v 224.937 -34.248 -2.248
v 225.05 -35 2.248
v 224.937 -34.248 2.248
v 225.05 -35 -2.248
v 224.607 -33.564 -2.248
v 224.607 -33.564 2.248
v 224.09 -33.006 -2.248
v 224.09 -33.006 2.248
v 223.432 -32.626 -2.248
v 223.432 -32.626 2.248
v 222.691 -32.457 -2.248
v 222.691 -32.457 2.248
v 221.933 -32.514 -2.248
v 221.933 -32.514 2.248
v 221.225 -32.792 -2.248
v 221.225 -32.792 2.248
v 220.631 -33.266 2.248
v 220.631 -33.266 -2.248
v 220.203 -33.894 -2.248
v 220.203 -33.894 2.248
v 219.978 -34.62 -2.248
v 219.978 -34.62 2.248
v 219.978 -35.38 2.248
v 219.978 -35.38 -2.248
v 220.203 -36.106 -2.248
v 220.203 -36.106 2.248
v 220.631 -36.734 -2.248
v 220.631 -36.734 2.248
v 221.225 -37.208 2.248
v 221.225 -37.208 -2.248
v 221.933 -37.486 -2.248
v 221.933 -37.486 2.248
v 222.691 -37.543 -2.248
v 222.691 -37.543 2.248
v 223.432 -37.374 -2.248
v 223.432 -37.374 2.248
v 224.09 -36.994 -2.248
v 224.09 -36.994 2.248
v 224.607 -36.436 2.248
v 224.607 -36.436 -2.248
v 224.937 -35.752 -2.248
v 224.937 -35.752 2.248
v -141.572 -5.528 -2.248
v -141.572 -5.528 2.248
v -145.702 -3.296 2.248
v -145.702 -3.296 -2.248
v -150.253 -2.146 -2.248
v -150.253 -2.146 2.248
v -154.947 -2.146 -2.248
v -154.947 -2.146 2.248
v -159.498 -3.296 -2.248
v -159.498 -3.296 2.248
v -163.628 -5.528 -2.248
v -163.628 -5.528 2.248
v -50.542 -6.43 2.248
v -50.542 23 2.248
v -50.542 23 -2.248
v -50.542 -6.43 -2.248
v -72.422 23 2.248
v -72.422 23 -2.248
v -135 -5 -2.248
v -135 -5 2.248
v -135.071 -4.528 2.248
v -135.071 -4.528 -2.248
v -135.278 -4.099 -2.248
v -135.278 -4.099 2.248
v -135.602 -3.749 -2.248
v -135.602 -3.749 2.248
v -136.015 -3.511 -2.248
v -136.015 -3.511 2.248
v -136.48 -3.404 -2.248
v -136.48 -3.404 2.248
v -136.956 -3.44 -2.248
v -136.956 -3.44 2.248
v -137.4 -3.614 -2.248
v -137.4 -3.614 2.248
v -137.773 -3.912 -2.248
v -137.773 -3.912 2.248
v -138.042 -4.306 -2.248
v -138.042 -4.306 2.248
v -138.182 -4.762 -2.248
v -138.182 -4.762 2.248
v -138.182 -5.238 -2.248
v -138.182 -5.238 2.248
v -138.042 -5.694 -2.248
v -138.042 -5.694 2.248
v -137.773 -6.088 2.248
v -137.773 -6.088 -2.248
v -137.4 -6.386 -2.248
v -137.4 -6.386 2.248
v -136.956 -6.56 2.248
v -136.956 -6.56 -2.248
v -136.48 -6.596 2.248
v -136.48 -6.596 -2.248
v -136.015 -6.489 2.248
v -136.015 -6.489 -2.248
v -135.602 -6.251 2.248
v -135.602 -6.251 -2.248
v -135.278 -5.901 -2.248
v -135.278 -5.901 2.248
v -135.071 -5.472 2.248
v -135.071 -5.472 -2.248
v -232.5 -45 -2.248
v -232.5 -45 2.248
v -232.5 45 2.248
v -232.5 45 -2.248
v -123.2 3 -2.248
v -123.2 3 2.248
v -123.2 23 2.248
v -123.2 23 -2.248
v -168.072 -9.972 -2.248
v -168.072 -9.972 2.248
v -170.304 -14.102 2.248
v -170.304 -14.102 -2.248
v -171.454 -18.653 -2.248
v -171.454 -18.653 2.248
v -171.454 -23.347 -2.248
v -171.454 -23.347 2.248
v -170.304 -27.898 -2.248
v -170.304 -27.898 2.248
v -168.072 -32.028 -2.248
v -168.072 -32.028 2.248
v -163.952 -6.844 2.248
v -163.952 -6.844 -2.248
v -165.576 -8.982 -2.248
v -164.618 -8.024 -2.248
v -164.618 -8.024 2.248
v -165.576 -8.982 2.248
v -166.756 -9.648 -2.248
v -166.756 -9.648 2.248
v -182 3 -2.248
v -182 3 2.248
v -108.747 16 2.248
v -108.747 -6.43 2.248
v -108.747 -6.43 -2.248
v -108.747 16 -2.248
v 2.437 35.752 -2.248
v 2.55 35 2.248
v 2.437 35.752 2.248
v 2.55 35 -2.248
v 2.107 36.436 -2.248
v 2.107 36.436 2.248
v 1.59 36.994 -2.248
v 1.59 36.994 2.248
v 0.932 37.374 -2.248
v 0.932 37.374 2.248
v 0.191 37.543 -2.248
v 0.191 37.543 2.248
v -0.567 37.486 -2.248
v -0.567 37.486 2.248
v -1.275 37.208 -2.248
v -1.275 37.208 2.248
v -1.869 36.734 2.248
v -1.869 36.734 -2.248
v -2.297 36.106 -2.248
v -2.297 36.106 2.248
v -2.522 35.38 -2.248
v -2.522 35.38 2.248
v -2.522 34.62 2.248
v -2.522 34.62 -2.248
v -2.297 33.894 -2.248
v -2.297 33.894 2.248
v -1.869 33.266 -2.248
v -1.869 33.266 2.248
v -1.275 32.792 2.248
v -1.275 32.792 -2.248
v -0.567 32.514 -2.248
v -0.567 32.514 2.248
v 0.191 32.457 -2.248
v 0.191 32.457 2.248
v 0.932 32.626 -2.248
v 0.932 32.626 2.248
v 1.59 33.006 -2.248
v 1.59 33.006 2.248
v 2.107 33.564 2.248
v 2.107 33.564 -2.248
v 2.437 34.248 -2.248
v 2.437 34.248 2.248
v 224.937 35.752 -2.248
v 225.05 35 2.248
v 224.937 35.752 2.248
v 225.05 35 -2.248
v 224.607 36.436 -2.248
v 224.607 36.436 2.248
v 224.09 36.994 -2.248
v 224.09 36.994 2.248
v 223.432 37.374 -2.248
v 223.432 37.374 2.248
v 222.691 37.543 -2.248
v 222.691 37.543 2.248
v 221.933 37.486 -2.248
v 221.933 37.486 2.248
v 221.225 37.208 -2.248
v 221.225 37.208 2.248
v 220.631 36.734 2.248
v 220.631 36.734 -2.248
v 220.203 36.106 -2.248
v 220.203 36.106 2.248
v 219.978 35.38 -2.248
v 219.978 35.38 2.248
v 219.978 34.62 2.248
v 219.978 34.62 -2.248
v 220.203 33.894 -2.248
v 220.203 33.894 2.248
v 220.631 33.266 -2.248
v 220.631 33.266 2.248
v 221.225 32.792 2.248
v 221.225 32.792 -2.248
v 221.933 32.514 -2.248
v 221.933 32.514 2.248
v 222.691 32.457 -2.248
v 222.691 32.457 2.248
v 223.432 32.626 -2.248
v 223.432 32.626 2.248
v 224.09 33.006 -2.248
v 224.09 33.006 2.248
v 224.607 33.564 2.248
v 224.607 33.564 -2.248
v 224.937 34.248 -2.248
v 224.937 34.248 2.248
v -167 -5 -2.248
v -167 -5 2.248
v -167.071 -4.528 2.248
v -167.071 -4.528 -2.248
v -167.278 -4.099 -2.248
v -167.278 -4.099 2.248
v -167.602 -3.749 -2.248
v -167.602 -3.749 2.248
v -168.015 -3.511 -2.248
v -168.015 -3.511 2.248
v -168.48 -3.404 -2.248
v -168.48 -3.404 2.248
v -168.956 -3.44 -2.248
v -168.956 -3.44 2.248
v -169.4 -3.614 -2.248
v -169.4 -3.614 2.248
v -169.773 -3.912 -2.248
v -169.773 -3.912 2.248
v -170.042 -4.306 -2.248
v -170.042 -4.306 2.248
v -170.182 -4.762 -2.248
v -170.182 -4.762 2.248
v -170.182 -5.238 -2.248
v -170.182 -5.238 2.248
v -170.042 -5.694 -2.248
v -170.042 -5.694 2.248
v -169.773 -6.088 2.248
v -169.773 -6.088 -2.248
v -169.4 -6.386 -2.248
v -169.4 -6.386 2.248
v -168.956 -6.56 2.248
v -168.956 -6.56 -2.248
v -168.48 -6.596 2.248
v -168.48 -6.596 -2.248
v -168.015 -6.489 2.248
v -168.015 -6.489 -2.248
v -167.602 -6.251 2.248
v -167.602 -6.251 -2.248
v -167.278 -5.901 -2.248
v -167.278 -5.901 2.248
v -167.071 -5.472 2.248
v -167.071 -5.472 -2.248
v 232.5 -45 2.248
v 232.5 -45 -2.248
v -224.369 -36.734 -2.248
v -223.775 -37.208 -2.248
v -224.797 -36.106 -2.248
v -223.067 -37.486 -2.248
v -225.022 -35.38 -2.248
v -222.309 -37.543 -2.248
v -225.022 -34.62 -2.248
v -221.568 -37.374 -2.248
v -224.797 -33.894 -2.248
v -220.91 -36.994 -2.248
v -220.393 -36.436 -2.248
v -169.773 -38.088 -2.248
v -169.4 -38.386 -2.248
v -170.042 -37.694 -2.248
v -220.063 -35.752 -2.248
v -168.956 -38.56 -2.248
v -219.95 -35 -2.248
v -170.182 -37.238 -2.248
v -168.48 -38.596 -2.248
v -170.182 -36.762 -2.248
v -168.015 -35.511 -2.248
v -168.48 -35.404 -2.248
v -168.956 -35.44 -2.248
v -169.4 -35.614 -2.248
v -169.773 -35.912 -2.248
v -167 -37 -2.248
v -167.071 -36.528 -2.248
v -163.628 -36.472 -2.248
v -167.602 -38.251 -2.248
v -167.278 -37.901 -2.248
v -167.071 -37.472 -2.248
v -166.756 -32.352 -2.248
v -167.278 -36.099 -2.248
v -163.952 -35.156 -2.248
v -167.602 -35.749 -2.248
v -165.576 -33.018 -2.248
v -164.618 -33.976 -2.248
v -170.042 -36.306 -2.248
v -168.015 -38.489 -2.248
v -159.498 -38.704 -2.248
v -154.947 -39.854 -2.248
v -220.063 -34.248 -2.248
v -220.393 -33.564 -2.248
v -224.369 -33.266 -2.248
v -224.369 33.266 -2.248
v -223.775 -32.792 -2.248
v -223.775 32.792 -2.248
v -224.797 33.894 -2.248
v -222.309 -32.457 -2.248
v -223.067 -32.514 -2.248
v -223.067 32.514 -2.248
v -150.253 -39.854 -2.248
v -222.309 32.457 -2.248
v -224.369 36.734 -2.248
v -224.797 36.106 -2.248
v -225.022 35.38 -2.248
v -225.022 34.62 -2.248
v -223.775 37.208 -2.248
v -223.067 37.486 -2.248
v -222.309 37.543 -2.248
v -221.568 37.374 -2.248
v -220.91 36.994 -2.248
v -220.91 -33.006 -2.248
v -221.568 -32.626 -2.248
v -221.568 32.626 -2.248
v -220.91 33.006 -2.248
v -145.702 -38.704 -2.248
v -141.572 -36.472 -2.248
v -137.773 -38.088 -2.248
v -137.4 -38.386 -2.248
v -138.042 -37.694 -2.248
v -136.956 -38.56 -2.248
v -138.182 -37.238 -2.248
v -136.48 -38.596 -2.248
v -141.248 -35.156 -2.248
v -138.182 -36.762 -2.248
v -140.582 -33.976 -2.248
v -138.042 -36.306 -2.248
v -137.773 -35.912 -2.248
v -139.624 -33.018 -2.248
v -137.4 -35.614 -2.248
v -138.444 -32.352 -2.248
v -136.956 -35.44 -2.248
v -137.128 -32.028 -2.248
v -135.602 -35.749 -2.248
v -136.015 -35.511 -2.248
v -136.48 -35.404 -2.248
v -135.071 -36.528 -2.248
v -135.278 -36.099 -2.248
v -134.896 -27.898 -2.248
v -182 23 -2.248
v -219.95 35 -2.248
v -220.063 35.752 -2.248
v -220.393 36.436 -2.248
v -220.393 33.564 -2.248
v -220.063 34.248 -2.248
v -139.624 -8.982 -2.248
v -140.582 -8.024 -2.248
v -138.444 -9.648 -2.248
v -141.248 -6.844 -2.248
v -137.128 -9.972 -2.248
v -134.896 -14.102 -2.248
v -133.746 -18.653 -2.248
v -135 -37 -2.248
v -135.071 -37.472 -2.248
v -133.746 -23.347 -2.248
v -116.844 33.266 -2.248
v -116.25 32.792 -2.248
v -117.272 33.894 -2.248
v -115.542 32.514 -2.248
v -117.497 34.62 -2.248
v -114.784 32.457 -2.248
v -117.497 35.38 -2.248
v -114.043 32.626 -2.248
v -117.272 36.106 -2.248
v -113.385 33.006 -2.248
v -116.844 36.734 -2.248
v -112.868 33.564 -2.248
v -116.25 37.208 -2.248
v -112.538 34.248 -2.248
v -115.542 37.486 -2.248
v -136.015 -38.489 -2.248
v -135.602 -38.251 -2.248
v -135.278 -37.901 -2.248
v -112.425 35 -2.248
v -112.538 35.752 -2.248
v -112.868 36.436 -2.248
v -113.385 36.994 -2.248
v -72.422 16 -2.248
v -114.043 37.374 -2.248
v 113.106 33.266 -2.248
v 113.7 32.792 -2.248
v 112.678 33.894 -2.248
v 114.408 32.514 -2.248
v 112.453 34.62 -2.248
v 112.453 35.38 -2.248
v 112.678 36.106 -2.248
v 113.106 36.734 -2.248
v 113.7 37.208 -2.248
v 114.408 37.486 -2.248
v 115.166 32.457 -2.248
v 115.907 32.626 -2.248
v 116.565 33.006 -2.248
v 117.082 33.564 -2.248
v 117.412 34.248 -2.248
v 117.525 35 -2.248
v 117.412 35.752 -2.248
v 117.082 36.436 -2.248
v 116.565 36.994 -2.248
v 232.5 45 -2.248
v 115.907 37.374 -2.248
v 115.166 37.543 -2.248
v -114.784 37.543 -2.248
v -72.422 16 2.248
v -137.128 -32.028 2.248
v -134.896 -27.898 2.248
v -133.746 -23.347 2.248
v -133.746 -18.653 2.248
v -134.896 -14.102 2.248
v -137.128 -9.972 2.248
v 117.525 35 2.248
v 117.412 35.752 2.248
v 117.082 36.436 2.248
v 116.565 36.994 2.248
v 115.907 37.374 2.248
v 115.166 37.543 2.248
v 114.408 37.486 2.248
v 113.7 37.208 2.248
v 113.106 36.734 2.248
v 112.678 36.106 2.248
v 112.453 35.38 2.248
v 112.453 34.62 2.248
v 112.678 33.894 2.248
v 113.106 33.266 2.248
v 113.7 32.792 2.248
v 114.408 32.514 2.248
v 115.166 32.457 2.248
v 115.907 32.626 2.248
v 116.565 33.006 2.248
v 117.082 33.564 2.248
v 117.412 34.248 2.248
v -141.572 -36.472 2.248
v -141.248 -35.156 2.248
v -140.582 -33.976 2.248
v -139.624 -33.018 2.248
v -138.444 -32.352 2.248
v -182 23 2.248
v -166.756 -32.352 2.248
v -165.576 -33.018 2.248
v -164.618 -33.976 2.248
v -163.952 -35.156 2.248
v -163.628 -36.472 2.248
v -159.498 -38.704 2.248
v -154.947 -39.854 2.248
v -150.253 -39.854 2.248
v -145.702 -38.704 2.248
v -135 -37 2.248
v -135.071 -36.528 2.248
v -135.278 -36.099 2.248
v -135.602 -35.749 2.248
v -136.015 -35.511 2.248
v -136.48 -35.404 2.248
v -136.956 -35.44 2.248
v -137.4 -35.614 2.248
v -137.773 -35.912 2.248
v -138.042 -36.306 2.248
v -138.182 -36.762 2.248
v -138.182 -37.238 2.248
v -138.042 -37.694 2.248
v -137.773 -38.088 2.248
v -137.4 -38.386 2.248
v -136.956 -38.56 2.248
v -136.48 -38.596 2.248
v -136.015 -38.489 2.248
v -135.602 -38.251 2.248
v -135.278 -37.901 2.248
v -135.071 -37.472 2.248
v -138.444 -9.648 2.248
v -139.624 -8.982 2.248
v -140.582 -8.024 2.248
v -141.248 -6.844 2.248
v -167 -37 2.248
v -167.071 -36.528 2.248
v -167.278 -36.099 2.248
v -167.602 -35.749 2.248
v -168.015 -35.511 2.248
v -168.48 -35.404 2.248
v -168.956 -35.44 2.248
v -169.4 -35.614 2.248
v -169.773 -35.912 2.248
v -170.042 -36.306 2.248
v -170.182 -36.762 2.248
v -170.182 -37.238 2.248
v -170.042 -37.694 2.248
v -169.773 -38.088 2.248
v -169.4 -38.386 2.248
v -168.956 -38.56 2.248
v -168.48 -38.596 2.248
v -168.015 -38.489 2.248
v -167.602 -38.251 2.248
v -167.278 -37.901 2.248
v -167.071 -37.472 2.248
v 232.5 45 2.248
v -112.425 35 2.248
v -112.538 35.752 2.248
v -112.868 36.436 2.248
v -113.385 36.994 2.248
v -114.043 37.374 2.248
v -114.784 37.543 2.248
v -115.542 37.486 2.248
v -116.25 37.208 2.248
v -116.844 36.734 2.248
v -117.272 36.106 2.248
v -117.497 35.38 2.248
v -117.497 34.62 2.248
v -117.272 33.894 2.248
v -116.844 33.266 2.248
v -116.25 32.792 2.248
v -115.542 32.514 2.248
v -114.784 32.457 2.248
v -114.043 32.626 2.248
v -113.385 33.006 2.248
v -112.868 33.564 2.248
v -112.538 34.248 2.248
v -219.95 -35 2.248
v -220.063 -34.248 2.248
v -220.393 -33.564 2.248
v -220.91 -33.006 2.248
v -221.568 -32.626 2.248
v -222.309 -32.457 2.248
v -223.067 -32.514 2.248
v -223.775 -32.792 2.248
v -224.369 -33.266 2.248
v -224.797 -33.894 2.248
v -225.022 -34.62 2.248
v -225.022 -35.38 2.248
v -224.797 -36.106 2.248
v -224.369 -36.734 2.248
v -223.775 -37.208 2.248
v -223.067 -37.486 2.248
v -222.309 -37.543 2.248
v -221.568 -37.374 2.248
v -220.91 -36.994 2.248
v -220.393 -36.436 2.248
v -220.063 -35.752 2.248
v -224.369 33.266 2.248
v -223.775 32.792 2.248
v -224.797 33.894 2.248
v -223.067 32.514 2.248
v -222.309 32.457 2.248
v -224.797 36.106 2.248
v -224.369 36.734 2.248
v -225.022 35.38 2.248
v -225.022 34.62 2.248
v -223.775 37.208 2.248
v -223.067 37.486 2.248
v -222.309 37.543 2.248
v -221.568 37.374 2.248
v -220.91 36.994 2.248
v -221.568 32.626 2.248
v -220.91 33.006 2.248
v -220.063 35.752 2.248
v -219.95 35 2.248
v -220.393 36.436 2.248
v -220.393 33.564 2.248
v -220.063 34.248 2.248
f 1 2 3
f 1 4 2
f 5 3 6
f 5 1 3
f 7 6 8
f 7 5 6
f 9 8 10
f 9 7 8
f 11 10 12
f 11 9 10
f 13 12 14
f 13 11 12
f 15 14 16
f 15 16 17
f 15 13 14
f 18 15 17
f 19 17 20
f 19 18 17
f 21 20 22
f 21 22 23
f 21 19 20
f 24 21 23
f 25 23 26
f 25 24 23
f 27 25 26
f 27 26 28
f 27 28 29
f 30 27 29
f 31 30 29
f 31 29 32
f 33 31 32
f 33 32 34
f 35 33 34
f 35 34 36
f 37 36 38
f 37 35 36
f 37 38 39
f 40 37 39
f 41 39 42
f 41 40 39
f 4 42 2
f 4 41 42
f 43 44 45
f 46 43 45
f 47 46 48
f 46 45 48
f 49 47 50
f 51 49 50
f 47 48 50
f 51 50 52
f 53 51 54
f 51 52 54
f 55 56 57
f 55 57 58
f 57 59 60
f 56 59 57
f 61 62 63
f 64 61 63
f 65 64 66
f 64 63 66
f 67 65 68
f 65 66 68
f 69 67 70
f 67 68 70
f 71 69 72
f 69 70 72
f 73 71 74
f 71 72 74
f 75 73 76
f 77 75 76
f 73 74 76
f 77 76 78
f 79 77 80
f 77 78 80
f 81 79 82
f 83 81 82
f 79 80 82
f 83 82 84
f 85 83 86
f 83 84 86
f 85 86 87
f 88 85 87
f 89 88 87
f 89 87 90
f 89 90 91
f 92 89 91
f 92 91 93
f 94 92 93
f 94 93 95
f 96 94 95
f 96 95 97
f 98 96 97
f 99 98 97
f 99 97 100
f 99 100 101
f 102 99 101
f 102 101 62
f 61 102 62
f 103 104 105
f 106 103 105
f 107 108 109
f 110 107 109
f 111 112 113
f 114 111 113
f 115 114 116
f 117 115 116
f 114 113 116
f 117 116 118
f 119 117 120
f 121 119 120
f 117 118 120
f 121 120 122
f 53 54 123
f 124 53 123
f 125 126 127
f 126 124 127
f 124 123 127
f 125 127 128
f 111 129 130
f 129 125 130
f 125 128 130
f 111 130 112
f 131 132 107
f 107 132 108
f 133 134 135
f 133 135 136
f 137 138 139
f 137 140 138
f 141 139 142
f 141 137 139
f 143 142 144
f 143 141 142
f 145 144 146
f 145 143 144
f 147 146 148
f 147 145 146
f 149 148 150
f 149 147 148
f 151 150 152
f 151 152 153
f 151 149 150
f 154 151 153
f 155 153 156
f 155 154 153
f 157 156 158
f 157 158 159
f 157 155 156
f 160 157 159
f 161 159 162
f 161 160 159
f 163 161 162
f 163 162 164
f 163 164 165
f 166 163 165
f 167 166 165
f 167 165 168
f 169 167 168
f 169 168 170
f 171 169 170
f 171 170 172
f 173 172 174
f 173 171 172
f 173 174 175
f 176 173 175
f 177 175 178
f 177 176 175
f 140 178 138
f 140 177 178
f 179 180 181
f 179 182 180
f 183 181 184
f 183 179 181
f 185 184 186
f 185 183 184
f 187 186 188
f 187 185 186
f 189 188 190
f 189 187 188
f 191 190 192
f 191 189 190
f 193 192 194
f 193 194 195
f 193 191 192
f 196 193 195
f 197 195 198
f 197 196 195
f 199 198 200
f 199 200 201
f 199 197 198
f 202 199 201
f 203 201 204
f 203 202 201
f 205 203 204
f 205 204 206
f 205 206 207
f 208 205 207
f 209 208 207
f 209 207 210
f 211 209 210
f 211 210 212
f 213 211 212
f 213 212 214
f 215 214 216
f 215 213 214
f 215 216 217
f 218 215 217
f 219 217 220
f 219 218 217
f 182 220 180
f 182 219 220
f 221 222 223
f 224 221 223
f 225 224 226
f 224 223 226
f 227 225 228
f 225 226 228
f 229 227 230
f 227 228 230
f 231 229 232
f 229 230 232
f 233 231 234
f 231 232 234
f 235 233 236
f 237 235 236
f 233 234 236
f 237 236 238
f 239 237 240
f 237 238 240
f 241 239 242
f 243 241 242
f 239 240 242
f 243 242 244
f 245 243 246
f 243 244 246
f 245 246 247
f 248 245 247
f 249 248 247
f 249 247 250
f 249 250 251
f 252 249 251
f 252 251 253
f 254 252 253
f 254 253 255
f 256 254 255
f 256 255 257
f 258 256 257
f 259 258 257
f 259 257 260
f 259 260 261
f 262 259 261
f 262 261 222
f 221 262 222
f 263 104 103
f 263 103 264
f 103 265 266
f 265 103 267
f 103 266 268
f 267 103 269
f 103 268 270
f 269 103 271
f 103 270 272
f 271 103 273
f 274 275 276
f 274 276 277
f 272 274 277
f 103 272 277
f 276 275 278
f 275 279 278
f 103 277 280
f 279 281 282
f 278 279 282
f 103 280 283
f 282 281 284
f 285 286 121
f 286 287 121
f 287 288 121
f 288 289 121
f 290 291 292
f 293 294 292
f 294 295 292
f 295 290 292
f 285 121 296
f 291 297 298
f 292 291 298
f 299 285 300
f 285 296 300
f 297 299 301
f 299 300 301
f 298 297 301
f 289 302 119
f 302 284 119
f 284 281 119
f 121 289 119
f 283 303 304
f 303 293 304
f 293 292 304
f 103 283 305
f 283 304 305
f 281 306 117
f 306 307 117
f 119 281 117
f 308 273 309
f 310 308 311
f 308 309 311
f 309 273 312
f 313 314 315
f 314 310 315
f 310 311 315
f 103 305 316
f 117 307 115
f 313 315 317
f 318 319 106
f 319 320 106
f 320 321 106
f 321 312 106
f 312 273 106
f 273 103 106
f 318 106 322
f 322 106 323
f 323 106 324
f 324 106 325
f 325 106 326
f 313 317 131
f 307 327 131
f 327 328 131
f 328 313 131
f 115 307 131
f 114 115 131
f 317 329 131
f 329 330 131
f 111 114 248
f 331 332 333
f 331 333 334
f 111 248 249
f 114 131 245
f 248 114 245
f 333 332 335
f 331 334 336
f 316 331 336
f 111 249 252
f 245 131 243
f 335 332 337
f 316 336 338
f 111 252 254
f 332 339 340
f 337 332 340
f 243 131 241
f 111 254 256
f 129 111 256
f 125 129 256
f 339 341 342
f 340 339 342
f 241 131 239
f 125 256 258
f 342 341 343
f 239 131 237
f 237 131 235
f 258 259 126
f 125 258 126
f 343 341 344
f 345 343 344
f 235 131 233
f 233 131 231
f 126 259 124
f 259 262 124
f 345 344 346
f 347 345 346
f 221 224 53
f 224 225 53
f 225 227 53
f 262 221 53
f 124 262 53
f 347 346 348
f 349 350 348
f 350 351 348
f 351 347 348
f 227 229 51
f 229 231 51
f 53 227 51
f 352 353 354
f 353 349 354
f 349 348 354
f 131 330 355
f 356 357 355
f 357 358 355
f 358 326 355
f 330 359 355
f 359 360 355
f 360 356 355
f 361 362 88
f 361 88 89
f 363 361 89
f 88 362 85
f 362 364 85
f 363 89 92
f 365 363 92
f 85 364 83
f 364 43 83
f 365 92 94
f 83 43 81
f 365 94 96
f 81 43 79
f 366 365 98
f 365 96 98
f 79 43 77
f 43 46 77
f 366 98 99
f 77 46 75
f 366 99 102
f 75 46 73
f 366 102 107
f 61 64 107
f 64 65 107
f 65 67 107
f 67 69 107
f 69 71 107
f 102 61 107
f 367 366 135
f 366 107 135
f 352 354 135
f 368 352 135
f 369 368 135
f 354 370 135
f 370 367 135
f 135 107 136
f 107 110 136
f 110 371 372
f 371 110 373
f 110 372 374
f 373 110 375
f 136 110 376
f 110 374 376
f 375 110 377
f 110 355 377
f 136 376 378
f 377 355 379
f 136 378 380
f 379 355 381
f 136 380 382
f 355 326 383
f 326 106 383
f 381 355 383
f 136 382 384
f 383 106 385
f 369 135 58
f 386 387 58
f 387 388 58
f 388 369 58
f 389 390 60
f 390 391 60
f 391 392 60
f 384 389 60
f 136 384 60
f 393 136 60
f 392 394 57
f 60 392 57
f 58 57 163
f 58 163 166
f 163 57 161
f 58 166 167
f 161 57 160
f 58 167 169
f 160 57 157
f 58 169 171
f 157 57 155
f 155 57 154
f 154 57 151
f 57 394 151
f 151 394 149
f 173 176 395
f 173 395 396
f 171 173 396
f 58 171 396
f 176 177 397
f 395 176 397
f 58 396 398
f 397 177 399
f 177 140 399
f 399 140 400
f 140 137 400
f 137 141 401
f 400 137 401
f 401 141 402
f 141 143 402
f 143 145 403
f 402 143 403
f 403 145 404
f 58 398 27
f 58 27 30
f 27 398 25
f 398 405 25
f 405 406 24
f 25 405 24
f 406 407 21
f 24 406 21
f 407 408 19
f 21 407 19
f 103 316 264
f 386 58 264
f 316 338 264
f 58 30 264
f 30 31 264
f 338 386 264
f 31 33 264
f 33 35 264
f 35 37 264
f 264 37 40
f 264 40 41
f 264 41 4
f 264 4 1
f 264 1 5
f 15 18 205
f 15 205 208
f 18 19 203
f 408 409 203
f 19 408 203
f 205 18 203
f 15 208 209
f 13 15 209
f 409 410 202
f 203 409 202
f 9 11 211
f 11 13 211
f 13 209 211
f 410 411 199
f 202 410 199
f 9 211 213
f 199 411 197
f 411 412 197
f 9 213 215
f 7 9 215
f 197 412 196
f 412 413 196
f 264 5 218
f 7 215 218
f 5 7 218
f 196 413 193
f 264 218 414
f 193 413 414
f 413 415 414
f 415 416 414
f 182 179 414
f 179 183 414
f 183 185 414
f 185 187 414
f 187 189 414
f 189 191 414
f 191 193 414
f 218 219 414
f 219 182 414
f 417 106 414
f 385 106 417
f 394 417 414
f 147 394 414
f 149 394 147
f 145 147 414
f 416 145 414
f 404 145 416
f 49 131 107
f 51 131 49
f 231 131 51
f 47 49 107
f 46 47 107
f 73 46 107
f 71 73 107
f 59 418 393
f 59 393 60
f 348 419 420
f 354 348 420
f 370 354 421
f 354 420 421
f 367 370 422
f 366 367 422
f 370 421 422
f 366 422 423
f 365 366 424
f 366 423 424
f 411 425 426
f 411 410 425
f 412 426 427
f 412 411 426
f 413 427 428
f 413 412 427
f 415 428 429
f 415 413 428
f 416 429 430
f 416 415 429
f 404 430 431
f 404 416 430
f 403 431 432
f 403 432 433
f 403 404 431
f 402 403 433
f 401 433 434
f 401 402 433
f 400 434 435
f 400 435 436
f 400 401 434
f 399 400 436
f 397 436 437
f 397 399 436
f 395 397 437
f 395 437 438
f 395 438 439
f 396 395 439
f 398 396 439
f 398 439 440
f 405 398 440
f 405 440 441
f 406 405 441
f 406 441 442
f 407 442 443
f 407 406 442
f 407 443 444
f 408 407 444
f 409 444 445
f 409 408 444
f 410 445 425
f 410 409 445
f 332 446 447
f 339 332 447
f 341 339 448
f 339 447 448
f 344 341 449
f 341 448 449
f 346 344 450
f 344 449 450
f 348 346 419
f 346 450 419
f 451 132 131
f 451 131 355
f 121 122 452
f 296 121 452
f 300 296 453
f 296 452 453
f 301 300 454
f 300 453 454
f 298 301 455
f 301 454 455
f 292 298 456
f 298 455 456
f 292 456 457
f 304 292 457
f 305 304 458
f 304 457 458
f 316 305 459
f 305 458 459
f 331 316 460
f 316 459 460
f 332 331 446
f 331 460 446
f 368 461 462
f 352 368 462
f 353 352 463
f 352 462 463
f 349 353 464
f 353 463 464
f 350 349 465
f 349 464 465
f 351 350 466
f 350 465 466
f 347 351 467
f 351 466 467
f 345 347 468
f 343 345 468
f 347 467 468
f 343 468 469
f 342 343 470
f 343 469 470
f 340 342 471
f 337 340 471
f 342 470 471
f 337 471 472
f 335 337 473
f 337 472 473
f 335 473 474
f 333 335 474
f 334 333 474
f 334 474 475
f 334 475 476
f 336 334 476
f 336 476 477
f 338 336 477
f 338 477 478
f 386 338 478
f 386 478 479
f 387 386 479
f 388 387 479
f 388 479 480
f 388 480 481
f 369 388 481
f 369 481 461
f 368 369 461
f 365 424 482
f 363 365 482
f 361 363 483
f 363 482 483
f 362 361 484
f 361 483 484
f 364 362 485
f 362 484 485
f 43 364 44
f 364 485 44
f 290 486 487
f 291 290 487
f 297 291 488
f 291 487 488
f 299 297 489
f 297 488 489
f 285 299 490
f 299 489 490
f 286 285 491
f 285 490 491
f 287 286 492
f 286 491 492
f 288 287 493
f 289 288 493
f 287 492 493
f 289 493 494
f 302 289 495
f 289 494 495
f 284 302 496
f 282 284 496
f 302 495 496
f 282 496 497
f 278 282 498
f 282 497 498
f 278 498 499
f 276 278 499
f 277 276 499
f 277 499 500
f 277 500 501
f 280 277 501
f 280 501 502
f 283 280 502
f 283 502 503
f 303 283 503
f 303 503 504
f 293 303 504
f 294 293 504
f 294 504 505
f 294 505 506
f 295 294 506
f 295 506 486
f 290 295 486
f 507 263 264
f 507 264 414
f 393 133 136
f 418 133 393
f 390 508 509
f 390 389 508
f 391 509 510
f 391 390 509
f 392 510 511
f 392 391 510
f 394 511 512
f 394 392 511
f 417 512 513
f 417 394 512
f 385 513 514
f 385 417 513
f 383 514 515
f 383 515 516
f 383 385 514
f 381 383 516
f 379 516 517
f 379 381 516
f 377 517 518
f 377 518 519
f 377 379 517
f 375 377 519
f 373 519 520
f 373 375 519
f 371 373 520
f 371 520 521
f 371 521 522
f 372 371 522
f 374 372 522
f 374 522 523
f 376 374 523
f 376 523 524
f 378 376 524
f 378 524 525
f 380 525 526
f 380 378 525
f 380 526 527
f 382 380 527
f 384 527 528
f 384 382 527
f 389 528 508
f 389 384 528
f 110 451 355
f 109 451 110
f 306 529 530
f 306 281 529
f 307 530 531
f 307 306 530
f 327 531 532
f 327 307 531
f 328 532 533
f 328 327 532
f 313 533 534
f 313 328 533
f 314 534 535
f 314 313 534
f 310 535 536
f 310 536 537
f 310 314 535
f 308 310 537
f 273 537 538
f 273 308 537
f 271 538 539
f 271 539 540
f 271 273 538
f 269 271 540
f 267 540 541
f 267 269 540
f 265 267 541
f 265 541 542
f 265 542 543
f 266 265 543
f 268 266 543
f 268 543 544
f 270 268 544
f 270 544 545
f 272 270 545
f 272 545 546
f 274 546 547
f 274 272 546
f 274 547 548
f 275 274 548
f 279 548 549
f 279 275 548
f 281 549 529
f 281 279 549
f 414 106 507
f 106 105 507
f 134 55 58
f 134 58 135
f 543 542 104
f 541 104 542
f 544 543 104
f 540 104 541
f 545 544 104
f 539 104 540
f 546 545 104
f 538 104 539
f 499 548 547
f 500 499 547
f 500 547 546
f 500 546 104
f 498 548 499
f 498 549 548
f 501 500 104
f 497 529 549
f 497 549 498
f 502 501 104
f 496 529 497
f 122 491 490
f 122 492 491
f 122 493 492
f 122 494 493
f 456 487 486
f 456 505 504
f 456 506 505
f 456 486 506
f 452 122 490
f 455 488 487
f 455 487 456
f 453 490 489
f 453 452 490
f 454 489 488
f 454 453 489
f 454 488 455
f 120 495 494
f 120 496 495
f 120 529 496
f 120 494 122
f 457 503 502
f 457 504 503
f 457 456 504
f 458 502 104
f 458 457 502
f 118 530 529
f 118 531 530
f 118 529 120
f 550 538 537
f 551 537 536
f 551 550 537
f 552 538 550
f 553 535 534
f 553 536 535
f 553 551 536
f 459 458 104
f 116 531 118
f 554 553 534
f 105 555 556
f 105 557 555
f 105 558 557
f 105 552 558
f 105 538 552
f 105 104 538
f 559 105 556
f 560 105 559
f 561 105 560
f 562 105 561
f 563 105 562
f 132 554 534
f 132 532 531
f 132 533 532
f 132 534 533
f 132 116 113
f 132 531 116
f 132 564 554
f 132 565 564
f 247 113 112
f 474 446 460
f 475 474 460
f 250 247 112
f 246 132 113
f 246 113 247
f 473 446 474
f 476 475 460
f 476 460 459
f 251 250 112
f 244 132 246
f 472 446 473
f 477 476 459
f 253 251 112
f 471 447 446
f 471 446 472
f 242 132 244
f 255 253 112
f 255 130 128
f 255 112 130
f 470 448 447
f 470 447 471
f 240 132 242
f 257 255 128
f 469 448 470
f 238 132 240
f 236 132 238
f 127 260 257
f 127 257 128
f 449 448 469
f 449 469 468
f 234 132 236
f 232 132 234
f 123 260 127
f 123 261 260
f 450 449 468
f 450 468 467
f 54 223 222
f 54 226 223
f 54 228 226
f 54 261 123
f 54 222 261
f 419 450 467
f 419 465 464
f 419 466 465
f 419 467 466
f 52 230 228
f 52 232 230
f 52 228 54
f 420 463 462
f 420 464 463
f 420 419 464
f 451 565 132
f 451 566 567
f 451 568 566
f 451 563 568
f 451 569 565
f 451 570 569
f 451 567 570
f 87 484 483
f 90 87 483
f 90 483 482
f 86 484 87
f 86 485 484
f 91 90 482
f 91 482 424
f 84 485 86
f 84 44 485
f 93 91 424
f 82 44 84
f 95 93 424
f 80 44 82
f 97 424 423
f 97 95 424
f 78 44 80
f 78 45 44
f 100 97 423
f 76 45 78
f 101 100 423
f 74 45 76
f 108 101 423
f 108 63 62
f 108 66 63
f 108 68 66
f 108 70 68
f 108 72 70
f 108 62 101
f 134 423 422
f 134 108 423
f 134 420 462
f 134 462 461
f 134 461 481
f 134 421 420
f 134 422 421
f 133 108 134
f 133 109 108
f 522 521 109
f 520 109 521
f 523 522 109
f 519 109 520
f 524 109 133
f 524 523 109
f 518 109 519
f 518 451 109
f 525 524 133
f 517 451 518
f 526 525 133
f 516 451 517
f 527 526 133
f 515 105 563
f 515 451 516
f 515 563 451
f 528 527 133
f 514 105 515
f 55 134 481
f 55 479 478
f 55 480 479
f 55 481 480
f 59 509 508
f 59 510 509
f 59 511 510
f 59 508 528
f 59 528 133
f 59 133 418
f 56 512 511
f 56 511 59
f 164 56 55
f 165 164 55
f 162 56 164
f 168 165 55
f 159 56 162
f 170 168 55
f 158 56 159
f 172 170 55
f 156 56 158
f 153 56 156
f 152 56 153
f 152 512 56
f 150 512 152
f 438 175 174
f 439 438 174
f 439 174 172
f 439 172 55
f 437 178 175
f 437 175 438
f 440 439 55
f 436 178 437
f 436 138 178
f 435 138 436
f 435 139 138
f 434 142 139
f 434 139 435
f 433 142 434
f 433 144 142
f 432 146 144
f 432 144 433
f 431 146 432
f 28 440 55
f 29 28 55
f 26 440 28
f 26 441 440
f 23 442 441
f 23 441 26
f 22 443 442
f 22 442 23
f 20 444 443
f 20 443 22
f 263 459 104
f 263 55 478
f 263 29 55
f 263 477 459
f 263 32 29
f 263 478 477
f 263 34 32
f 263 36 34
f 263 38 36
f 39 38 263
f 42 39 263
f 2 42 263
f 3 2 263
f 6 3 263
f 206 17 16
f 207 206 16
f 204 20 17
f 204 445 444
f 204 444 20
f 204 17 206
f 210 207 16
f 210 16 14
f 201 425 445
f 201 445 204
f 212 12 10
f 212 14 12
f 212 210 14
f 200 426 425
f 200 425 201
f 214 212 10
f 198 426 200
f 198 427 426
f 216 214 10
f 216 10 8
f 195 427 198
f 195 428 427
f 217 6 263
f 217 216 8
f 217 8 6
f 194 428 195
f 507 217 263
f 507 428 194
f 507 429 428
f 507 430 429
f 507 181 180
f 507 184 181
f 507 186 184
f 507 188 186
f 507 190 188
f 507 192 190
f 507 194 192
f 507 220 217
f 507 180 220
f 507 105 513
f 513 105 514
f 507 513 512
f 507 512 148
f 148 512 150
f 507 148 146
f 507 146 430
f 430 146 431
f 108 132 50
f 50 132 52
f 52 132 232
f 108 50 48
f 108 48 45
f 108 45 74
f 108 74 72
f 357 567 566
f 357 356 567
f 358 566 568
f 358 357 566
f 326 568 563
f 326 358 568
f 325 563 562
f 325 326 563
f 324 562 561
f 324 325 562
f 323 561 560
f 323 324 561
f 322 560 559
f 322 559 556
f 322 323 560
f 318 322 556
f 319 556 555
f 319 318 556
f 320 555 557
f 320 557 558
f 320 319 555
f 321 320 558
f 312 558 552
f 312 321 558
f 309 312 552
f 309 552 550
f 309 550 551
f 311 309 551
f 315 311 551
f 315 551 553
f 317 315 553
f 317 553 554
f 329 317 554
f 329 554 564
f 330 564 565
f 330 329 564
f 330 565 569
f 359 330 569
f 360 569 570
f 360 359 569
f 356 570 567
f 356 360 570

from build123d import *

# Parameters (mm, degrees)
SKETCH1_W           = 465
SKETCH1_H           = 90
SKETCH1_R           = 2.55
BOSS_EXTRUDE1_DEPTH = 2.2479
CUT_EXTRUDE1_REACH  = 6.496
SKETCH2_R           = 1.6
SKETCH2_W           = 58.8
SKETCH2_H           = 20


with BuildPart() as part:
    # Sketch1 → Boss-Extrude1 (new body, symmetric)
    with BuildSketch(Plane.XY):
        Rectangle(SKETCH1_W, SKETCH1_H)
        with Locations((-222.5, 35)):
            Circle(SKETCH1_R, mode=Mode.SUBTRACT)
        with Locations((-222.5, -35)):
            Circle(SKETCH1_R, mode=Mode.SUBTRACT)
        with Locations((0, 35)):
            Circle(SKETCH1_R, mode=Mode.SUBTRACT)
        with Locations((-114.975, 35)):
            Circle(SKETCH1_R, mode=Mode.SUBTRACT)
        with Locations((222.5, -35)):
            Circle(SKETCH1_R, mode=Mode.SUBTRACT)
        with Locations((222.5, 35)):
            Circle(SKETCH1_R, mode=Mode.SUBTRACT)
        with Locations((114.975, 35)):
            Circle(SKETCH1_R, mode=Mode.SUBTRACT)
    extrude(amount=BOSS_EXTRUDE1_DEPTH, both=True)

    # Sketch2 → Cut-Extrude1 (cut, up to next)
    with BuildSketch(Plane.XY.offset(2.2479), mode=Mode.PRIVATE) as cut_extrude1_sk1:
        with Locations((-136.600006438, -5)):
            Circle(SKETCH2_R)
    cut_extrude1_tool1 = extrude(cut_extrude1_sk1.sketch, amount=-CUT_EXTRUDE1_REACH, mode=Mode.PRIVATE) & part.part
    add(cut_extrude1_tool1.solids().sort_by_distance((-136.600006, -5, 2.2479))[0], mode=Mode.SUBTRACT)
    # Sketch2 → Cut-Extrude1 (cut, up to next)
    with BuildSketch(Plane.XY.offset(2.2479), mode=Mode.PRIVATE) as cut_extrude1_sk2:
        with Locations((-168.600006438, -5)):
            Circle(SKETCH2_R)
    cut_extrude1_tool2 = extrude(cut_extrude1_sk2.sketch, amount=-CUT_EXTRUDE1_REACH, mode=Mode.PRIVATE) & part.part
    add(cut_extrude1_tool2.solids().sort_by_distance((-168.600006, -5, 2.2479))[0], mode=Mode.SUBTRACT)
    # Sketch2 → Cut-Extrude1 (cut, up to next)
    with BuildSketch(Plane.XY.offset(2.2479), mode=Mode.PRIVATE) as cut_extrude1_sk3:
        with Locations((-168.600006438, -37)):
            Circle(SKETCH2_R)
    cut_extrude1_tool3 = extrude(cut_extrude1_sk3.sketch, amount=-CUT_EXTRUDE1_REACH, mode=Mode.PRIVATE) & part.part
    add(cut_extrude1_tool3.solids().sort_by_distance((-168.600006, -37, 2.2479))[0], mode=Mode.SUBTRACT)
    # Sketch2 → Cut-Extrude1 (cut, up to next)
    with BuildSketch(Plane.XY.offset(2.2479), mode=Mode.PRIVATE) as cut_extrude1_sk4:
        with Locations((-136.600006438, -37)):
            Circle(SKETCH2_R)
    cut_extrude1_tool4 = extrude(cut_extrude1_sk4.sketch, amount=-CUT_EXTRUDE1_REACH, mode=Mode.PRIVATE) & part.part
    add(cut_extrude1_tool4.solids().sort_by_distance((-136.600006, -37, 2.2479))[0], mode=Mode.SUBTRACT)
    # Sketch2 → Cut-Extrude1 (cut, up to next)
    with BuildSketch(Plane.XY.offset(2.2479), mode=Mode.PRIVATE) as cut_extrude1_sk5:
        Polygon((-108.747160909, 16), (-72.422339974, 16), (-72.422339974, 23), (-50.542339974, 23), (-50.542339974, -6.43), (-108.747160909, -6.43), align=None)
    cut_extrude1_tool5 = extrude(cut_extrude1_sk5.sketch, amount=-CUT_EXTRUDE1_REACH, mode=Mode.PRIVATE) & part.part
    add(cut_extrude1_tool5.solids().sort_by_distance((-77.737733, 6.330046, 2.2479))[0], mode=Mode.SUBTRACT)
    # Sketch2 → Cut-Extrude1 (cut, up to next)
    with BuildSketch(Plane.XY.offset(2.2479), mode=Mode.PRIVATE) as cut_extrude1_sk6:
        with Locations((-152.600006438, 13)):
            Rectangle(SKETCH2_W, SKETCH2_H)
    cut_extrude1_tool6 = extrude(cut_extrude1_sk6.sketch, amount=-CUT_EXTRUDE1_REACH, mode=Mode.PRIVATE) & part.part
    add(cut_extrude1_tool6.solids().sort_by_distance((-152.600006, 13, 2.2479))[0], mode=Mode.SUBTRACT)
    # Sketch2 → Cut-Extrude1 (cut, up to next)
    with BuildSketch(Plane.XY.offset(2.2479), mode=Mode.PRIVATE) as cut_extrude1_sk7:
        with BuildLine():
            ThreePointArc((-163.627957833, -36.472048604), (-152.600006438, -40), (-141.572055042, -36.472048604))
            ThreePointArc((-141.572055042, -36.472048604), (-140.135540343, -33.464466094), (-137.127957833, -32.027951396))
            ThreePointArc((-137.127957833, -32.027951396), (-133.600006437, -21), (-137.127957833, -9.972048604))
            ThreePointArc((-137.127957833, -9.972048604), (-140.135540343, -8.535533906), (-141.572055042, -5.527951396))
            ThreePointArc((-141.572055042, -5.527951396), (-152.600006438, -2), (-163.627957833, -5.527951396))
            ThreePointArc((-163.627957833, -5.527951396), (-165.064472532, -8.535533906), (-168.072055042, -9.972048604))
            ThreePointArc((-168.072055042, -9.972048604), (-171.600006437, -21), (-168.072055042, -32.027951396))
            ThreePointArc((-168.072055042, -32.027951396), (-165.064472532, -33.464466094), (-163.627957833, -36.472048604))
        make_face()
    cut_extrude1_tool7 = extrude(cut_extrude1_sk7.sketch, amount=-CUT_EXTRUDE1_REACH, mode=Mode.PRIVATE) & part.part
    add(cut_extrude1_tool7.solids().sort_by_distance((-152.600006, -21, 2.2479))[0], mode=Mode.SUBTRACT)


solid = part.part
